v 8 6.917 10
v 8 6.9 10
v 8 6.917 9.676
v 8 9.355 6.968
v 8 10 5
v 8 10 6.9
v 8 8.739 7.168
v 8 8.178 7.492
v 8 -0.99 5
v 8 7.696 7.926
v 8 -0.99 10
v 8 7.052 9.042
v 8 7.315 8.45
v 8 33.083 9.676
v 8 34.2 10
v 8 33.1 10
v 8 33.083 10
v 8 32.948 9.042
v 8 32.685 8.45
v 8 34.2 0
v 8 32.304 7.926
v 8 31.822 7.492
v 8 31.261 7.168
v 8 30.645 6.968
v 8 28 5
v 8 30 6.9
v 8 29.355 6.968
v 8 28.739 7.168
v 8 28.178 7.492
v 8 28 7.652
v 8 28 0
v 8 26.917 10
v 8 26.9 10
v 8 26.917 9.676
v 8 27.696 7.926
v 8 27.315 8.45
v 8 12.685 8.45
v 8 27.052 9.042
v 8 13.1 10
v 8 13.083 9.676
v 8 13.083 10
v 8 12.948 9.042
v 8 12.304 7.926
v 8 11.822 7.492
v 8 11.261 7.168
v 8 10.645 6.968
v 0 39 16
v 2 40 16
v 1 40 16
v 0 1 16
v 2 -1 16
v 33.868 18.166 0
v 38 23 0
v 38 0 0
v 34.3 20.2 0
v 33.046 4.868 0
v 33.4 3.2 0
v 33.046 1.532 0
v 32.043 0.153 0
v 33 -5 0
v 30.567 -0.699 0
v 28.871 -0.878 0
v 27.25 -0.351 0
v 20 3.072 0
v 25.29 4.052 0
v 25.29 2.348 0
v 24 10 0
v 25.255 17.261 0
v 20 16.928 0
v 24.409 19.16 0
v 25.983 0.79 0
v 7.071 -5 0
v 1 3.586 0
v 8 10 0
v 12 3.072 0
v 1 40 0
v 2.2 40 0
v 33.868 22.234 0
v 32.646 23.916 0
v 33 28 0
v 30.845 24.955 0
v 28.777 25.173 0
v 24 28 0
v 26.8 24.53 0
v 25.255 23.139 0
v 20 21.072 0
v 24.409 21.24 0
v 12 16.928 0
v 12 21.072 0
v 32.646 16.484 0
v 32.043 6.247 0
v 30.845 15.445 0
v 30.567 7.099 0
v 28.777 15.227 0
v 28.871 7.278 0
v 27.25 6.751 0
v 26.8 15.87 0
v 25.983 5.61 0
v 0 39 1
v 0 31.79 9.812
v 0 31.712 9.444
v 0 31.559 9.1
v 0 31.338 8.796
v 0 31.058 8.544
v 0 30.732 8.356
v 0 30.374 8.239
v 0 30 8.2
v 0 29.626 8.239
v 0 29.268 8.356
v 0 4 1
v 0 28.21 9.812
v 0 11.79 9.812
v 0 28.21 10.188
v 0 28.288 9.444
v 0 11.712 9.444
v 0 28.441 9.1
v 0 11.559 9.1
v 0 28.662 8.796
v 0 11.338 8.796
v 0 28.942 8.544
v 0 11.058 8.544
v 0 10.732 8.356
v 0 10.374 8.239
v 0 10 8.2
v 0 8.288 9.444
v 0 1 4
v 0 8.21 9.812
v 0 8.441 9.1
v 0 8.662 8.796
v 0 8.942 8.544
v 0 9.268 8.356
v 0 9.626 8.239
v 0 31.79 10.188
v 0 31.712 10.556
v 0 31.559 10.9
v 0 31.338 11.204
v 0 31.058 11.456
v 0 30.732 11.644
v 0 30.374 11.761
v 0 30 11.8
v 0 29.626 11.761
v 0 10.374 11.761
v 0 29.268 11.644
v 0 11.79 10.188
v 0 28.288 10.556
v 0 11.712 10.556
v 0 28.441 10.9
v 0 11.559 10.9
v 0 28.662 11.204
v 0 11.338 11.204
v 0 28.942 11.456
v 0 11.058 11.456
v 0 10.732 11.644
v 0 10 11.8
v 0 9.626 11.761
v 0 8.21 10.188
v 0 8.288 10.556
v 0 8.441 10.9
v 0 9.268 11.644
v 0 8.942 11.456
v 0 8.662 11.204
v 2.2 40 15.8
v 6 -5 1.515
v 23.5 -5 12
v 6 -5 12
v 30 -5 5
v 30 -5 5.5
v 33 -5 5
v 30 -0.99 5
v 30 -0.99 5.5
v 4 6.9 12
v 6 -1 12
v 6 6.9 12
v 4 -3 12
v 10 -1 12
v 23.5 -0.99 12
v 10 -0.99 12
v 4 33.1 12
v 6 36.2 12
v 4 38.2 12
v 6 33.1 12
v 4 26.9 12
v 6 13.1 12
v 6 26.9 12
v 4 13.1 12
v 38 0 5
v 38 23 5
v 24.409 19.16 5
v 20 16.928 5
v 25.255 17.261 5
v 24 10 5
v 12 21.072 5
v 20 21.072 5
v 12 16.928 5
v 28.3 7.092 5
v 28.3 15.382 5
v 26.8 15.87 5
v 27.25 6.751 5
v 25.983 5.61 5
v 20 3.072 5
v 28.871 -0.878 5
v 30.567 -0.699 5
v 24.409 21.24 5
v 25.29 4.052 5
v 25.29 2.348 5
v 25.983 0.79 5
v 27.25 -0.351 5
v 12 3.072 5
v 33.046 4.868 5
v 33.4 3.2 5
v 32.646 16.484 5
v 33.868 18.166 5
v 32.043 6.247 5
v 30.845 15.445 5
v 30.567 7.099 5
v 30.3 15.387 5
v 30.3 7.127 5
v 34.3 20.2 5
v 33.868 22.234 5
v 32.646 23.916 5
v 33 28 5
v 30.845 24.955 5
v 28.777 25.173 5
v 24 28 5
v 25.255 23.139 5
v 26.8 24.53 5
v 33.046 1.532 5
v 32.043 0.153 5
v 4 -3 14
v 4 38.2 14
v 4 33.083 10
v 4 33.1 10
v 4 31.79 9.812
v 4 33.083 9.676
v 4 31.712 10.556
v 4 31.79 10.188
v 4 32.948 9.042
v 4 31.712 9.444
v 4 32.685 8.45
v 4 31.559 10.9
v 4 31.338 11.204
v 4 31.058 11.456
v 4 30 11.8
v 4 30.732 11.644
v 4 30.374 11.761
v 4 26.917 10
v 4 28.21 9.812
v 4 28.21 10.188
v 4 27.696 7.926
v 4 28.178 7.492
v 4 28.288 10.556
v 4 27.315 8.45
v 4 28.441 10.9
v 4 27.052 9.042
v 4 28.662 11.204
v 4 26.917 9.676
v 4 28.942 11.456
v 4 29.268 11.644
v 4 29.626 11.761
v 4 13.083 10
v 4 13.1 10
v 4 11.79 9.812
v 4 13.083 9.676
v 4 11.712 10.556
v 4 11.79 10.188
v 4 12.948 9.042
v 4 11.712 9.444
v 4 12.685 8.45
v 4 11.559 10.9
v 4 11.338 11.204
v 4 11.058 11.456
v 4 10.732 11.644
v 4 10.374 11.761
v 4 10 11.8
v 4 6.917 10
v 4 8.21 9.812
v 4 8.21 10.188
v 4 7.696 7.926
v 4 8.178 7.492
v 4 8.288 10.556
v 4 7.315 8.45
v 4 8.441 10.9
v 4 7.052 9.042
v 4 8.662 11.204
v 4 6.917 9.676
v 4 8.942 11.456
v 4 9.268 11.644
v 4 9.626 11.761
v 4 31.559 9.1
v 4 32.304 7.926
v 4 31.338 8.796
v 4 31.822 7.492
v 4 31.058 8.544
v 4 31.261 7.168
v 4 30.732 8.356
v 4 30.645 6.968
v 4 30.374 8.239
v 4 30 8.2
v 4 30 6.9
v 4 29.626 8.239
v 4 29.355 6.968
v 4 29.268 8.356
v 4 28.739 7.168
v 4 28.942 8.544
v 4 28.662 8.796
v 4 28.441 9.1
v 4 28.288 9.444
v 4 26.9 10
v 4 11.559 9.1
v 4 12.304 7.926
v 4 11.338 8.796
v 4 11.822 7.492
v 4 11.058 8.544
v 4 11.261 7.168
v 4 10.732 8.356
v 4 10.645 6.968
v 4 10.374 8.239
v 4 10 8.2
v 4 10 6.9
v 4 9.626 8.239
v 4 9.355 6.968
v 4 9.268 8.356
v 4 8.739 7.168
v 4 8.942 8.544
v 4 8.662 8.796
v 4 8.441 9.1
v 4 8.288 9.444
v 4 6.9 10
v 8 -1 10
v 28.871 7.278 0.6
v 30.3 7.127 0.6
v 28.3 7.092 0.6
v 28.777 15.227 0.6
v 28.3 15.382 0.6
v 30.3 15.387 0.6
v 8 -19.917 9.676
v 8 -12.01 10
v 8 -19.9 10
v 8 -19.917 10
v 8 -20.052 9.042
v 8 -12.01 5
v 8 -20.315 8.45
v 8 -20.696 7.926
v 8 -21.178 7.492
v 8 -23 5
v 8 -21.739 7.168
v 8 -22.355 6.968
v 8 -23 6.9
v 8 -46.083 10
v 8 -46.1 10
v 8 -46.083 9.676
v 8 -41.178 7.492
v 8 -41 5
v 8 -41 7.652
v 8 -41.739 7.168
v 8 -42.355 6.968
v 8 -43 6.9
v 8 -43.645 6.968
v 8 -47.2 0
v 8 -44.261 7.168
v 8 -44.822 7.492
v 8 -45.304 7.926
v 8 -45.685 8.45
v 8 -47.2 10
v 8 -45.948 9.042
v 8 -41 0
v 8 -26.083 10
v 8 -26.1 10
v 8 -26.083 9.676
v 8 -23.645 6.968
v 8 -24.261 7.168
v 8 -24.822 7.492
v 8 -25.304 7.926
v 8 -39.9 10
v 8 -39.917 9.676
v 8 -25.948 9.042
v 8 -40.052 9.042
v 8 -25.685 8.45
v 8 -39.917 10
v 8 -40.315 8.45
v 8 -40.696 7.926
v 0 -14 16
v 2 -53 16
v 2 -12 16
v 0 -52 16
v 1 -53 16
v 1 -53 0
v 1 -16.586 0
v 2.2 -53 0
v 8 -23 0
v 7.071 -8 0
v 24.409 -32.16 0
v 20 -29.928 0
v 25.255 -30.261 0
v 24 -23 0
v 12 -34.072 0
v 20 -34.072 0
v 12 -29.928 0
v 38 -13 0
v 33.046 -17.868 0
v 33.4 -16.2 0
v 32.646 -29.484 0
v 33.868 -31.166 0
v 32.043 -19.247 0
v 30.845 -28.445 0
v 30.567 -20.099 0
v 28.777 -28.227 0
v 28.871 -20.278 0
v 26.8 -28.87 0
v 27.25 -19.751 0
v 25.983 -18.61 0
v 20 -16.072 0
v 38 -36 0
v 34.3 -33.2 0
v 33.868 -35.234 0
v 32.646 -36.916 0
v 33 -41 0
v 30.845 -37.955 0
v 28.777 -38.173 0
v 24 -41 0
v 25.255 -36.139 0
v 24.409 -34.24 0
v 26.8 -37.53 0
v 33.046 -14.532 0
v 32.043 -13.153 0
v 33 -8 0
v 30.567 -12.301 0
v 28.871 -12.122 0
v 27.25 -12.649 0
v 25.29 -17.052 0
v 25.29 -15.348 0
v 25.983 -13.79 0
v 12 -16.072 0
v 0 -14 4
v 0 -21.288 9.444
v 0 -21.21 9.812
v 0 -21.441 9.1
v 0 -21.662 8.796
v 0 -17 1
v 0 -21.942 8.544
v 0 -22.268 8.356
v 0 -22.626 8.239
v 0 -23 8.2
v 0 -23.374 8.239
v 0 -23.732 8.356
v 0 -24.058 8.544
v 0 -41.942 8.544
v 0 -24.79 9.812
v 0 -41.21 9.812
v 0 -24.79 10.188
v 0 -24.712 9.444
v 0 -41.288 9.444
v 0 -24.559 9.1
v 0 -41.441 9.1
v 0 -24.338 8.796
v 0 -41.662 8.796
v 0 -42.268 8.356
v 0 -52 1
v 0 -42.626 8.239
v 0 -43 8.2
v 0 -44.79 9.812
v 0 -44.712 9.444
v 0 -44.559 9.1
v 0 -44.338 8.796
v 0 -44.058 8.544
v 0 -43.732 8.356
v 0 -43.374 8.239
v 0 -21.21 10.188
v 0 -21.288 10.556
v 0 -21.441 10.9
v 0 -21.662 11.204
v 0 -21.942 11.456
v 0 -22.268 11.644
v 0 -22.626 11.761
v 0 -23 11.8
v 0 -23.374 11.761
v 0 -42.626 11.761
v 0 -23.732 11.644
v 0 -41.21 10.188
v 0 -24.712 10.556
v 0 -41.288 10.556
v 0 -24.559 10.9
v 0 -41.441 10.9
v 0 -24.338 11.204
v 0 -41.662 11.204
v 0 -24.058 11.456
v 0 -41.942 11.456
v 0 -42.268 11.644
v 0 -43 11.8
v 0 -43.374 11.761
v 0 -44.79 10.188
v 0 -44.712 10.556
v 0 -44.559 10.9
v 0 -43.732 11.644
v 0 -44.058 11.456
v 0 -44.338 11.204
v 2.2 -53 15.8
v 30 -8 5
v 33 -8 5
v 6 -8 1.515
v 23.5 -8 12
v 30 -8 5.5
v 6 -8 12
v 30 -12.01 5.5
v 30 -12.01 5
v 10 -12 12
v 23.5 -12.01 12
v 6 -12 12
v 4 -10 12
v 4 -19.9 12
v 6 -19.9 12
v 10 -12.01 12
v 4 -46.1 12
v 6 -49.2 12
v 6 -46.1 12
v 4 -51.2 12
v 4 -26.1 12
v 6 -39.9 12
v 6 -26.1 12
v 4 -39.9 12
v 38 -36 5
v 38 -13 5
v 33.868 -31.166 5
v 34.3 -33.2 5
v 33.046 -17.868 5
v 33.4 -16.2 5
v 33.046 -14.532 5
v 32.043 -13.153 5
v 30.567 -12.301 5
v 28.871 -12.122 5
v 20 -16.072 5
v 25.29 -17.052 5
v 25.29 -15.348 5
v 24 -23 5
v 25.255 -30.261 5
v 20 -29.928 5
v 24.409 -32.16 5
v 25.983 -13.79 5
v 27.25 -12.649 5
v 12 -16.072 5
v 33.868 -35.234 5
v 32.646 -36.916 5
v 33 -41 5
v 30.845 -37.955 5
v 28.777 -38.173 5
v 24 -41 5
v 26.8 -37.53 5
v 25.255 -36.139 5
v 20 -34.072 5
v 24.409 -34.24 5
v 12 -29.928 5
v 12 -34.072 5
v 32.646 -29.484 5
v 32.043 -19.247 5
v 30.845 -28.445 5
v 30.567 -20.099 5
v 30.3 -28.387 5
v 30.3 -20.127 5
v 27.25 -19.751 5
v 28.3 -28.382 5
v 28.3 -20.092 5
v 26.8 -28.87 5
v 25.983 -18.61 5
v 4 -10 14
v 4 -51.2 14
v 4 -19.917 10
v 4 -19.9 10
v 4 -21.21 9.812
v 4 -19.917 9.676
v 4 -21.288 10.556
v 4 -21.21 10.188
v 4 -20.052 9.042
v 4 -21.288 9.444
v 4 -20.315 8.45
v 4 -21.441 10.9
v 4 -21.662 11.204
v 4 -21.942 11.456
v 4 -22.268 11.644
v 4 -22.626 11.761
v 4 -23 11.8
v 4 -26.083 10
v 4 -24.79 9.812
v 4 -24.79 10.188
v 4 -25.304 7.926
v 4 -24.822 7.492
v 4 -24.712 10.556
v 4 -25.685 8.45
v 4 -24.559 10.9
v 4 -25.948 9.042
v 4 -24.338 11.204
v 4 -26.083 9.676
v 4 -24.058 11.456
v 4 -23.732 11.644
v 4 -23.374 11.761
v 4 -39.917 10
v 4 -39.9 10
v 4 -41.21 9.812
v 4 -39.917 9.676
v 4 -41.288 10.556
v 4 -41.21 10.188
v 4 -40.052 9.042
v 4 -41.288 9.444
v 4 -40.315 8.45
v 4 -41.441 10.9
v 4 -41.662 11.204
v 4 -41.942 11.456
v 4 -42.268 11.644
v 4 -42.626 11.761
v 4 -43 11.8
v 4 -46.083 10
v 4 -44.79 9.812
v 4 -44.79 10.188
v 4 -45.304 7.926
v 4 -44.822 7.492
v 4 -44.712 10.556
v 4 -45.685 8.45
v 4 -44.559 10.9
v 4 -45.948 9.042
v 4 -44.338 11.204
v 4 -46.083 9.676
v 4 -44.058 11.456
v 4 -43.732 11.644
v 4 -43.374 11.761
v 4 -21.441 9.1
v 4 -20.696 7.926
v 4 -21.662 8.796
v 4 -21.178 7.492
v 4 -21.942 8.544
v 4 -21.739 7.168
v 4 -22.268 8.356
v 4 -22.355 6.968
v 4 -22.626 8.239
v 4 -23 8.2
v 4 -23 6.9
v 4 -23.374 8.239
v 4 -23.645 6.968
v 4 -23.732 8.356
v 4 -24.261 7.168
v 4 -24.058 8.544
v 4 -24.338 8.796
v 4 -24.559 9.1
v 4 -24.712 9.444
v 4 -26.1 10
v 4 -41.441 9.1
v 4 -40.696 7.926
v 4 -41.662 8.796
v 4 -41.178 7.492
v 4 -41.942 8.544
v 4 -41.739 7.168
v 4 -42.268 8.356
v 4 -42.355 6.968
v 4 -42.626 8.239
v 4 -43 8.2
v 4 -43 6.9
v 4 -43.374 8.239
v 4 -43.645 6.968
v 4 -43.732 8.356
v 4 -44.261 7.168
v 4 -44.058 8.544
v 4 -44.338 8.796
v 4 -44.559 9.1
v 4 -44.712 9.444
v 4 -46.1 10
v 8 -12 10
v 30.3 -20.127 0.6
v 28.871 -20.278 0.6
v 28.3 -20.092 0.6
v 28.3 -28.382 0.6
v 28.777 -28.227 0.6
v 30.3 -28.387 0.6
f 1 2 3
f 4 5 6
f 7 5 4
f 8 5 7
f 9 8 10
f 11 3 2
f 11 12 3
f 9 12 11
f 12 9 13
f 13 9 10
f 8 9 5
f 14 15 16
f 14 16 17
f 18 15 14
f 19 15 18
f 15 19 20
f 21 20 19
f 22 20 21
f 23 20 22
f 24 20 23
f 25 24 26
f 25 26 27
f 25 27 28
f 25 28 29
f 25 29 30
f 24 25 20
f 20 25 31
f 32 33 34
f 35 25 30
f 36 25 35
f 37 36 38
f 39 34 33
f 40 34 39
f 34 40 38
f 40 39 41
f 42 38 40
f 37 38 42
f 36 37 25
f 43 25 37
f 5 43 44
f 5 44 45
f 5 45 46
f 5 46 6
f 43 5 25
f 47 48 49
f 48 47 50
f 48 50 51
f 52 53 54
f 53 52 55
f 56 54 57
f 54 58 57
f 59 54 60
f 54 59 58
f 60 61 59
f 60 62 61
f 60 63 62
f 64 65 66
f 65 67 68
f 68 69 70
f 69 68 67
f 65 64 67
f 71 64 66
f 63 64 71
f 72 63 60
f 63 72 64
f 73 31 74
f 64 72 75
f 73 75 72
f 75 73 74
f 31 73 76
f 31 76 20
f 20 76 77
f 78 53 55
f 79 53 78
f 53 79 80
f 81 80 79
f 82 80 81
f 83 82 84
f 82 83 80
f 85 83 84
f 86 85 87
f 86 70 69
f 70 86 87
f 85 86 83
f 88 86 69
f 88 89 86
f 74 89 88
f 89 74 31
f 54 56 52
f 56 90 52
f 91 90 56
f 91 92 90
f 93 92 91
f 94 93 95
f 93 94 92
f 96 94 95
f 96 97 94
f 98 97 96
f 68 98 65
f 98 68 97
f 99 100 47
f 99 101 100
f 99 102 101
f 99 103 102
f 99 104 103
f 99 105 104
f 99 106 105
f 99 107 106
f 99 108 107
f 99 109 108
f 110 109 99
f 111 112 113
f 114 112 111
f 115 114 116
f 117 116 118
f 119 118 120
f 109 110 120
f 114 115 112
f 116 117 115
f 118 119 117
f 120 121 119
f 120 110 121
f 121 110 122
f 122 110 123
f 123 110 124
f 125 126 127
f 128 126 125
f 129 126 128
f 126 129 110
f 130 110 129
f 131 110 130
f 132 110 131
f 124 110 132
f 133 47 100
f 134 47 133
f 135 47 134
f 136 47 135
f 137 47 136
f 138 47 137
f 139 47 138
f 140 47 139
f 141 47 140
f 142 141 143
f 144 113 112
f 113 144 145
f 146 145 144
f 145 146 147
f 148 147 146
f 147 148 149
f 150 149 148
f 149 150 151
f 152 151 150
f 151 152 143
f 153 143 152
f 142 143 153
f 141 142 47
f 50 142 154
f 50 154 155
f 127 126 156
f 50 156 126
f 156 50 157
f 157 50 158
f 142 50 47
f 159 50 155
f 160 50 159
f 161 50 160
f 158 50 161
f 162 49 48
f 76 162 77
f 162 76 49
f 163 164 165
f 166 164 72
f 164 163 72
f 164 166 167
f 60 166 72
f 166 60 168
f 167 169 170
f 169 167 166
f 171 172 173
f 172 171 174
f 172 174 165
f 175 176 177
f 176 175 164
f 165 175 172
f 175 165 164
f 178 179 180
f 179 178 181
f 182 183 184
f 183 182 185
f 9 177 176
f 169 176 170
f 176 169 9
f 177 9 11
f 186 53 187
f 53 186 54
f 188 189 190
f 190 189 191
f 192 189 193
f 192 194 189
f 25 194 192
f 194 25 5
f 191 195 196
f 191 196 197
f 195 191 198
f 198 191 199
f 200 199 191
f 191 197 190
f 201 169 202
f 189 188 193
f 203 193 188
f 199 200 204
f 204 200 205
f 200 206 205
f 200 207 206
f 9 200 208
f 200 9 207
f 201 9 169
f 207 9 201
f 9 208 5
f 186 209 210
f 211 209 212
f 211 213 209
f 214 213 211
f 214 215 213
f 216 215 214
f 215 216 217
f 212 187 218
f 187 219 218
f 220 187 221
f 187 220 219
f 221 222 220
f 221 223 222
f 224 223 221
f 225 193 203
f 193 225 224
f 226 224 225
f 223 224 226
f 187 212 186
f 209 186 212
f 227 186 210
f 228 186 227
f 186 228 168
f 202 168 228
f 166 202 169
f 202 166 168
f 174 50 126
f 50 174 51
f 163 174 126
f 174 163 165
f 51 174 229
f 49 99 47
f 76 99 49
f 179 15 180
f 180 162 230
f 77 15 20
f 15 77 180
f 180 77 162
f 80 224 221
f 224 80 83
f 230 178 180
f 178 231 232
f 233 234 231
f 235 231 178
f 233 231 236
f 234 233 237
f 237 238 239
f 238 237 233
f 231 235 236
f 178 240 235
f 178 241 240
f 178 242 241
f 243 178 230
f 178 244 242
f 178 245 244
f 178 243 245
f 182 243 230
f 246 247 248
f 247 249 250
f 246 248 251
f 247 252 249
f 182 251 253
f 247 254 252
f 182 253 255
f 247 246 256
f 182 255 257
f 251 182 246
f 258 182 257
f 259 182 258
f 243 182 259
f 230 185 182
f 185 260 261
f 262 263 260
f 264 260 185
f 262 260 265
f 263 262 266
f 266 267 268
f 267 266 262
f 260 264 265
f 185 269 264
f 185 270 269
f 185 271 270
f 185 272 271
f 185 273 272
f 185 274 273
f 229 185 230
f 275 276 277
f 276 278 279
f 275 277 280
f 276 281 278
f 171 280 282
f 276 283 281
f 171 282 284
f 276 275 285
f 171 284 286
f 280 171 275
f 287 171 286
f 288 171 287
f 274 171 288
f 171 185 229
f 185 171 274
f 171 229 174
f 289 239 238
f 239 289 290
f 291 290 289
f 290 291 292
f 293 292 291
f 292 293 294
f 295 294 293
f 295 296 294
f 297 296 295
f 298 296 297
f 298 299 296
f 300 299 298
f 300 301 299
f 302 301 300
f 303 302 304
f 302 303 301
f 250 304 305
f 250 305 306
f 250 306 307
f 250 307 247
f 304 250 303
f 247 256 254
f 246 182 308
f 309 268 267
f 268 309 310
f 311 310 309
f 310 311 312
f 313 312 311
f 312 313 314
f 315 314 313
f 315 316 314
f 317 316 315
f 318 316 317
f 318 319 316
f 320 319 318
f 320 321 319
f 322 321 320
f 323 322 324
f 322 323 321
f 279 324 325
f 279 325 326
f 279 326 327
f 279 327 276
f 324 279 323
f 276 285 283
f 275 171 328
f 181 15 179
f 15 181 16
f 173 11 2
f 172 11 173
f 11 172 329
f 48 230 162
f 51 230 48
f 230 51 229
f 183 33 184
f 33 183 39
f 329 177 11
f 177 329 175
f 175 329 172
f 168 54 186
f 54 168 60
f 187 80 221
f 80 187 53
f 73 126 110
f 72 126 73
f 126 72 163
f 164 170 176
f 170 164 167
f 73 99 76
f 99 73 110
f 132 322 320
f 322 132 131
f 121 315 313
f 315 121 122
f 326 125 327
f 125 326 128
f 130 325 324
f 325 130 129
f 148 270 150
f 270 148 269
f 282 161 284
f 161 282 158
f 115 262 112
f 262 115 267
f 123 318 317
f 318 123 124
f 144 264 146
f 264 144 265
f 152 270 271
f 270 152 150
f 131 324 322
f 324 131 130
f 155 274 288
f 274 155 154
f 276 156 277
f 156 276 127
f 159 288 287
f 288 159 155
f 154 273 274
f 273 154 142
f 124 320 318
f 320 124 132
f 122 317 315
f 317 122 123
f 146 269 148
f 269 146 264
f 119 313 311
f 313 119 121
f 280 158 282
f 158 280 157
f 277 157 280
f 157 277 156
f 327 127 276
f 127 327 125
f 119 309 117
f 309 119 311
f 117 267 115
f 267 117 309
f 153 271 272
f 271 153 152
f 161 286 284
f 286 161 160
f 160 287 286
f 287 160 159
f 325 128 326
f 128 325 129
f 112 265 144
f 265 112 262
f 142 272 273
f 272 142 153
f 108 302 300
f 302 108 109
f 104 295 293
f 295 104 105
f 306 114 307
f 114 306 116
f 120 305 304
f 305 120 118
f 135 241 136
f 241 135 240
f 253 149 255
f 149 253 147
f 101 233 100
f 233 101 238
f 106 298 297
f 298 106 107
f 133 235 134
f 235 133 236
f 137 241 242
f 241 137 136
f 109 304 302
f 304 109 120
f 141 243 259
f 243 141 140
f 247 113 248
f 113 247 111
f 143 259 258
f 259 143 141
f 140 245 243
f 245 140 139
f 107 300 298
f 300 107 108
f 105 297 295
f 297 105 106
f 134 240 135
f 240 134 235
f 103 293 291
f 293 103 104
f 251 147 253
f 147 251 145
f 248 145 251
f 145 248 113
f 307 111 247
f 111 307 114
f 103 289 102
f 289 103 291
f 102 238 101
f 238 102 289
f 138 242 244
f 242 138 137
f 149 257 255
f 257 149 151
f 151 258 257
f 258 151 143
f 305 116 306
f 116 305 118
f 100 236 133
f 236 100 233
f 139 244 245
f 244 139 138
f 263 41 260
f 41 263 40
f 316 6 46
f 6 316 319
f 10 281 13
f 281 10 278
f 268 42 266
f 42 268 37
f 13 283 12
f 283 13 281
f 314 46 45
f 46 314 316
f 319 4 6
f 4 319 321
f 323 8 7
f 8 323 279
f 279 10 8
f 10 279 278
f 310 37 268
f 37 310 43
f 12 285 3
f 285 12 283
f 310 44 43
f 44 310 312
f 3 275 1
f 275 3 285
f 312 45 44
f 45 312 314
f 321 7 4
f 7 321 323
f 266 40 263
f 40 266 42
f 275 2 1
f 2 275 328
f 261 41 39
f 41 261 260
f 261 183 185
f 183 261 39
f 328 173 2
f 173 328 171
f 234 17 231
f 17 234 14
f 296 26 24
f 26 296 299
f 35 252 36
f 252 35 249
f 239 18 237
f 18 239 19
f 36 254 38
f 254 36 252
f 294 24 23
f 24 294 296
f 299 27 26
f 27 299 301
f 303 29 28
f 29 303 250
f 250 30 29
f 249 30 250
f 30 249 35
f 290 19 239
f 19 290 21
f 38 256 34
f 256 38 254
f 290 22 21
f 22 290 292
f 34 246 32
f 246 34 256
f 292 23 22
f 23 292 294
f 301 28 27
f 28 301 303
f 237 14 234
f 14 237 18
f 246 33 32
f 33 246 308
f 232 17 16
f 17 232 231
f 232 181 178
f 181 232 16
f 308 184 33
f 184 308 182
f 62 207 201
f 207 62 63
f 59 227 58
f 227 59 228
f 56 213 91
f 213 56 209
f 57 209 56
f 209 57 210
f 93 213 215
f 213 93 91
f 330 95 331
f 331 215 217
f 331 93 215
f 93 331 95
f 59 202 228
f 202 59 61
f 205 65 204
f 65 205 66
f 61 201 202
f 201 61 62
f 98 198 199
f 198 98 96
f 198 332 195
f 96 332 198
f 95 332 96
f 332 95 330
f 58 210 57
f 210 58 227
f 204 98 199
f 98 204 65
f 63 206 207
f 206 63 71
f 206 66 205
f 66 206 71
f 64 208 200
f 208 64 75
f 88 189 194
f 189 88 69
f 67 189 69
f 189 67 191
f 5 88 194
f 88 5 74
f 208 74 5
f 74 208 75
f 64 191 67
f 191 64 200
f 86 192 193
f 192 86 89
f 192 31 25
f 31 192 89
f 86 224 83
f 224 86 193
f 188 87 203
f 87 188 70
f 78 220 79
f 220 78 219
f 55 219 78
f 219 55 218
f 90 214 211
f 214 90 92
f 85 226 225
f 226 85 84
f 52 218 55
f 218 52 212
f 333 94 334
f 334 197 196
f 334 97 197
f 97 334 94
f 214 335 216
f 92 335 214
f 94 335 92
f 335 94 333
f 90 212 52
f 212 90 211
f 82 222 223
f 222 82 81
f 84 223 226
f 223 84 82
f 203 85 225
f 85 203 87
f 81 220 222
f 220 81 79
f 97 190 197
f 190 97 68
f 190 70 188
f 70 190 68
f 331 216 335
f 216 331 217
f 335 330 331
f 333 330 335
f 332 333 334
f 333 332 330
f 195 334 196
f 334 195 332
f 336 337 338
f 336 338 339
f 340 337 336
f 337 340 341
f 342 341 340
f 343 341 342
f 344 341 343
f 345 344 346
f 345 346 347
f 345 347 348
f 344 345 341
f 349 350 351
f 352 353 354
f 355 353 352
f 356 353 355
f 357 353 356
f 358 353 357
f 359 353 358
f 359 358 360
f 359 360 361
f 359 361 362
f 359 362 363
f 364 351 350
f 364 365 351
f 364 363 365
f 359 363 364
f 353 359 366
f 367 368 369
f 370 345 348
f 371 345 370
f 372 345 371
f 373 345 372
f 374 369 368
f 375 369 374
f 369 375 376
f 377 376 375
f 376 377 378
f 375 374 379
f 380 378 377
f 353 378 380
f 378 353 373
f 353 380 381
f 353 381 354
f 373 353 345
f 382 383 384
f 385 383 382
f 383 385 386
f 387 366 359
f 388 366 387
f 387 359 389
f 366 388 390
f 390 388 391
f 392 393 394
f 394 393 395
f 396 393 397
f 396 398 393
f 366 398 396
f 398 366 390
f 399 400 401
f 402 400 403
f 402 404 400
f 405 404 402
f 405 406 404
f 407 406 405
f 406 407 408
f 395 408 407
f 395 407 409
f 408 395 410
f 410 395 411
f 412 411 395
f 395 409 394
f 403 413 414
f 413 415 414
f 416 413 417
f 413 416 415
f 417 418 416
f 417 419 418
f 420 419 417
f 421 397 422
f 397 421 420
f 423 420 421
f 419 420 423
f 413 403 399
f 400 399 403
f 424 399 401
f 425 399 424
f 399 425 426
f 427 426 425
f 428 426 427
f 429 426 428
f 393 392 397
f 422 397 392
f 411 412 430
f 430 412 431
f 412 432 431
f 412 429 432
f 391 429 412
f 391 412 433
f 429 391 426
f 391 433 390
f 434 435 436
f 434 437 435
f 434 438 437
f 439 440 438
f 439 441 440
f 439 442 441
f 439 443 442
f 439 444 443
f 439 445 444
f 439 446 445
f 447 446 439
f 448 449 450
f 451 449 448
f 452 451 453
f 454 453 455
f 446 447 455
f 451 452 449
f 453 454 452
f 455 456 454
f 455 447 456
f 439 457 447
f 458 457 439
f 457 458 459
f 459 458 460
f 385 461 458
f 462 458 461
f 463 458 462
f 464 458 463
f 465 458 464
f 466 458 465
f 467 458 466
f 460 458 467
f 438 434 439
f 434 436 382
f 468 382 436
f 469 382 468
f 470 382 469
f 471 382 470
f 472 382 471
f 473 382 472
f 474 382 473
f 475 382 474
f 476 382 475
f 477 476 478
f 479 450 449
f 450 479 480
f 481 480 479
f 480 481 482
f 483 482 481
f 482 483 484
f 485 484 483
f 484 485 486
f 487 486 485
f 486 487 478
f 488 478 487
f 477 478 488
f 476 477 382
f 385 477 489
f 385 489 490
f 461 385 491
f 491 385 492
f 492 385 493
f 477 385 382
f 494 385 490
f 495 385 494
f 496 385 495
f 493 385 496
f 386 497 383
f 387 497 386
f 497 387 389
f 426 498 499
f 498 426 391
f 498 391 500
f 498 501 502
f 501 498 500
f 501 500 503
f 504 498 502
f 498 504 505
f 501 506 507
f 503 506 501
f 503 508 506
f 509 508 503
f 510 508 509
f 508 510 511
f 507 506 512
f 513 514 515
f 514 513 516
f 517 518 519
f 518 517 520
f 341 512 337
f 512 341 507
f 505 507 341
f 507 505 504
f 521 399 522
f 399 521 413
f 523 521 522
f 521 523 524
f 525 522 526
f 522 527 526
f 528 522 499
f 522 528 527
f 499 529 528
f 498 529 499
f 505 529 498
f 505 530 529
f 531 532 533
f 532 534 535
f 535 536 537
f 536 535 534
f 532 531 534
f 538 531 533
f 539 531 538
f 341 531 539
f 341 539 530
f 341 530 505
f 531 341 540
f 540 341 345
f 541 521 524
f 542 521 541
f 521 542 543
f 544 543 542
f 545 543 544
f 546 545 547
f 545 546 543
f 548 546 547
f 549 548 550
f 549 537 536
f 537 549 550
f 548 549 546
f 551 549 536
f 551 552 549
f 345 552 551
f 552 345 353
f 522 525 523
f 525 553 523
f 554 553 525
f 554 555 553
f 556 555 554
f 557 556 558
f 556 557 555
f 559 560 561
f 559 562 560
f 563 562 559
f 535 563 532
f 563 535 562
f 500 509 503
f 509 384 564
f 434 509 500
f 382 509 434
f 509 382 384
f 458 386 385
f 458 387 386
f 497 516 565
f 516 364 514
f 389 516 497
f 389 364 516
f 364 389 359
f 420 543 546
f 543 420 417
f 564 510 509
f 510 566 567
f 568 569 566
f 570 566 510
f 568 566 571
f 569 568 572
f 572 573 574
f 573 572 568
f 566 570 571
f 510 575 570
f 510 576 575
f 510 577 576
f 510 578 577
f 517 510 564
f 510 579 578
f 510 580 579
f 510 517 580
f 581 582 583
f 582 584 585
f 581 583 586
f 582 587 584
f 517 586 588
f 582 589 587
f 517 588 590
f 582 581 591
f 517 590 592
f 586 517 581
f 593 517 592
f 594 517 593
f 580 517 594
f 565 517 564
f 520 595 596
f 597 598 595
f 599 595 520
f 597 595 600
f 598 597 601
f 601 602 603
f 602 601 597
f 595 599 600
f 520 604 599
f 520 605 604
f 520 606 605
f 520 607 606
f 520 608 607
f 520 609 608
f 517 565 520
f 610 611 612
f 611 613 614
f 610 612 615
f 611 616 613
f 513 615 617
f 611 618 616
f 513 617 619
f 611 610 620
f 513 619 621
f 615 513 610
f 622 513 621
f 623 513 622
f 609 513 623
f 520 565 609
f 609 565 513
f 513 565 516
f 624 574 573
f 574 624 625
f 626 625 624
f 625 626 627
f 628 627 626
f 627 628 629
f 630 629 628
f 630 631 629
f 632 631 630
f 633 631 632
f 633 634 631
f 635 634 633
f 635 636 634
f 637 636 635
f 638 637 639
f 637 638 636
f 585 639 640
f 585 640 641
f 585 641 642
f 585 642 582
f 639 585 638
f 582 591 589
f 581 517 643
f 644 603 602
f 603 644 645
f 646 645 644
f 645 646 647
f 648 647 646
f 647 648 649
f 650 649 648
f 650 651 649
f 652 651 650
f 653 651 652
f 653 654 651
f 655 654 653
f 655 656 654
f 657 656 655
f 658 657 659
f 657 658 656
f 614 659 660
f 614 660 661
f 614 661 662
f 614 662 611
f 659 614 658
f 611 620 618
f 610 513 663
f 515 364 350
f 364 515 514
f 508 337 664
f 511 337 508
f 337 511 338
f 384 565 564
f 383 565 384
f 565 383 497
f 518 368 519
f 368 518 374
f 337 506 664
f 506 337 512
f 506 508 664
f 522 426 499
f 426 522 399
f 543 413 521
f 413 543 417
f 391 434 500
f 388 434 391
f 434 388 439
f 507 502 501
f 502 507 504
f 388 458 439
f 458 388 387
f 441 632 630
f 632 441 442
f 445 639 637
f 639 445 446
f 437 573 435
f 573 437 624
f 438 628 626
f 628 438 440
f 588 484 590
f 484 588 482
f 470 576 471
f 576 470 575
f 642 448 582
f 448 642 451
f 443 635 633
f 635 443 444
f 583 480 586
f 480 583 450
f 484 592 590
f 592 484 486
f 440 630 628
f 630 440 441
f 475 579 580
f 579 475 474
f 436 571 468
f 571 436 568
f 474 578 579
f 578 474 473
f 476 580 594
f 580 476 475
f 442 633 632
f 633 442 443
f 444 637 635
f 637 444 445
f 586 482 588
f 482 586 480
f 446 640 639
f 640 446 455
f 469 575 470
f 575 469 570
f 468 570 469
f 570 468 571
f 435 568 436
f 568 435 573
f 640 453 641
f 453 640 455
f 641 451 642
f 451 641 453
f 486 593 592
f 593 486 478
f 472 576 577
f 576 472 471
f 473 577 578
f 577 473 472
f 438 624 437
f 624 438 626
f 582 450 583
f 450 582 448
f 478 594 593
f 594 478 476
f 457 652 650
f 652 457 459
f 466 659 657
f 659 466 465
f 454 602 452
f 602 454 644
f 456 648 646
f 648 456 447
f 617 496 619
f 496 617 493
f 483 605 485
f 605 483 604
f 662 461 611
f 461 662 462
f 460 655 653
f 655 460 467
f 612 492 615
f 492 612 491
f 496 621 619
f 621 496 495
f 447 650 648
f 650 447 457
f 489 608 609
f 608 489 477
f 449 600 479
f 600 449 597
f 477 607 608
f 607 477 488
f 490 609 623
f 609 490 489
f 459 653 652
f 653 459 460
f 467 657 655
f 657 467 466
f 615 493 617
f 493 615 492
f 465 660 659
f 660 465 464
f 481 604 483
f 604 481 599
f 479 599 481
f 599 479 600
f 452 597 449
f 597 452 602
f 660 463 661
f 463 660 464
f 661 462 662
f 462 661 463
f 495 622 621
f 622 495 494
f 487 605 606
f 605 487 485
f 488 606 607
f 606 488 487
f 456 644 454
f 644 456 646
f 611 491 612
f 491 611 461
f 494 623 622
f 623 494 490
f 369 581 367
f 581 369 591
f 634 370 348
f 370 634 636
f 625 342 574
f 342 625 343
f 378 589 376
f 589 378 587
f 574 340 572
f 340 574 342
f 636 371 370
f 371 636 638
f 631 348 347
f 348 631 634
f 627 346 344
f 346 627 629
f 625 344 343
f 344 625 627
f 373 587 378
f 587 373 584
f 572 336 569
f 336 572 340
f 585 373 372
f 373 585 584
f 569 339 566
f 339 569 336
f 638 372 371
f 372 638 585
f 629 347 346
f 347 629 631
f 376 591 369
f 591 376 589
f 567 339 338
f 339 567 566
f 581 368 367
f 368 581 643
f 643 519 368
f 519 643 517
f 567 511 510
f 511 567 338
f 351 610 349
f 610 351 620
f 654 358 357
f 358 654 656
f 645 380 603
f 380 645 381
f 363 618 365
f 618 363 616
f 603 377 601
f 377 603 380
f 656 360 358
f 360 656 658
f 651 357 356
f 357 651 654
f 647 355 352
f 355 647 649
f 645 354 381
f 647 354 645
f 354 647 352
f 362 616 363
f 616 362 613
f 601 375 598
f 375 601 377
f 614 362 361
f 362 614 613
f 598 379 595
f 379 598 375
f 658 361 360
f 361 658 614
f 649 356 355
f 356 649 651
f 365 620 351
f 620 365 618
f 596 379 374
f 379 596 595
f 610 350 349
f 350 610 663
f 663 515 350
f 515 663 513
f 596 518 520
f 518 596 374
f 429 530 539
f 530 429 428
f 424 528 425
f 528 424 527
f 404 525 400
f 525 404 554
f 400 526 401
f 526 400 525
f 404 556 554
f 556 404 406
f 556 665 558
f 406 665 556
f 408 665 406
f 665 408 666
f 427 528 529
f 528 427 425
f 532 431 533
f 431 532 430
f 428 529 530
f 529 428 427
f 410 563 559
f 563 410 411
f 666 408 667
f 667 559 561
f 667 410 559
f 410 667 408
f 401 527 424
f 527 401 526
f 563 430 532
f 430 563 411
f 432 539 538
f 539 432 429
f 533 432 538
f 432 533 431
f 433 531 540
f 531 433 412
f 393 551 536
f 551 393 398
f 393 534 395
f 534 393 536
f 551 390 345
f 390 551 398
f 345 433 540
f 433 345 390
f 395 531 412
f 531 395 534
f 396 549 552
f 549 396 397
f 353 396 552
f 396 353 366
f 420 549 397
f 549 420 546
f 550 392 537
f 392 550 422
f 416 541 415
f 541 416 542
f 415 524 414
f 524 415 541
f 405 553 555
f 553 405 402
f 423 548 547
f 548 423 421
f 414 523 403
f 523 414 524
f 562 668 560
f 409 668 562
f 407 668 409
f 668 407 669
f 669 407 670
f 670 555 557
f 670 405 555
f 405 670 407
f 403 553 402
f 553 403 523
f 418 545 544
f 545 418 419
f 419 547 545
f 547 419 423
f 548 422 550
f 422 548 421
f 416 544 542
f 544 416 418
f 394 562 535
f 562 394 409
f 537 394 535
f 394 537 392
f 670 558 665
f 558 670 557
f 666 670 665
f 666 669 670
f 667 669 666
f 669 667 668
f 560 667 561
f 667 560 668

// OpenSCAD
// PRUSA iteration3
// Z axis top holder
// GNU GPL v3
// Josef Průša <iam@josefprusa.cz> and contributors
// http://www.reprap.org/wiki/Prusa_Mendel
// http://prusamendel.org


module z_top_base(){
 translate([0,-5,0]) cube([8,45,16]); // plate touching the base
 translate([0,-5,0]) cube([30,4.01,12]); // plate touching the base
 translate([0,-5,0]) cube([38,45,5]); // plate touching the base   
}

module z_top_fancy(){
 // Corner cutouts
 translate([0.5,0.5,0])         rotate([0,0,-45-180]) translate([-15,0,-1]) cube([30,30,51]);    
 translate([0.5,40-0.5,0])      rotate([0,0,-45+90])  translate([-15,0,-1]) cube([30,30,51]);  
 
    
 translate([-13,40+5+10.2,0])   rotate([0,0,-45-0])   translate([0,0,-1])   cube([30,30,51]); // frame side angle
 translate([8,28,0]) translate([0,0,-1]) cube([50,50,51]);       

 translate([4,0,12]) rotate([0,0, 0])    translate([0,-5,0]) cube([30,50,30]);          
 translate([6,0,12]) rotate([0,-45, 0])  translate([0,-5,0]) cube([30,50,30]);
 translate([8,4,10]) rotate([0,-45, 0])  translate([0,-5,0]) cube([30,50,30]);

 translate([38-2.5,-5+2.5,0])   rotate([0,0,-45-90]) translate([-15,0,-1]) cube([30,30,51]);         
 translate([35,26,0])           rotate([0,0,-45])    translate([-15,0,-1]) cube([30,30,51]); // outer corner
 translate([0,0,5])             rotate([45+180,0,0]) rotate([0,0,-45+90])  translate([0,0,-15]) cube([30,30,30]);

 // Stiffner cut out
 translate([30,0,5.5]) rotate([0,-45,0]) translate([0,-5,0]) cube([30,50,30]);
 //easy cleanup fix
 translate([0.5,0,0.5]) rotate([0,45,0]) translate([-2.5,0,-5]) cube([5,40,5]);
}

module z_top_holes(){
     // Screw holes frame
     translate([-1,10,10])      rotate([0,90,0]) cylinder(h = 20, r=1.8, $fn=30);
     translate([-1,10+20,10])   rotate([0,90,0]) cylinder(h = 20, r=1.8, $fn=30);
    

    // Screw heads
    translate([4,10,10]) rotate([0,90,0]) cylinder(h = 20, r=3.1, $fn=30);
    translate([4,10-3.1,10]) cube([10,6.2,10]);
    translate([4,10+20,10])  rotate([0,90,0]) cylinder(h = 20, r=3.1, $fn=30);
    translate([4,10+20-3.1,10]) cube([10,6.2,10]);

    // Z rod holder
    translate([25+4.3,3.2,-1]) rotate([0,0,0]) cylinder(h = 50, r=4.1, $fn=15);

    
    
    // odlehceni A
    translate([16,10,-1]) rotate([0,0,0]) cylinder(h = 50, r=8, $fn=6); // odlehceni
    translate([16,28,-1]) rotate([0,0,0]) cylinder(h = 50, r=8, $fn=6); // odlehceni
    
    translate([25+4.3,3.2+17,-1]) rotate([0,0,0]) cylinder(h = 50, r=5, $fn=15); // screw hole

    translate([25+4.3-1,3,0.6]) cube([2,15,7]); // it's bit up because it helps with printing
 
}

module z_top_right(){
    difference(){
        z_top_base();
        z_top_fancy();
        z_top_holes();
    }
}

module z_top_left(){
    translate([0,-13,0]) mirror([0,1,0]) 
    difference(){
        z_top_base();
        z_top_fancy();
        z_top_holes();
    }
}

// Final part
z_top_left();
z_top_right();
